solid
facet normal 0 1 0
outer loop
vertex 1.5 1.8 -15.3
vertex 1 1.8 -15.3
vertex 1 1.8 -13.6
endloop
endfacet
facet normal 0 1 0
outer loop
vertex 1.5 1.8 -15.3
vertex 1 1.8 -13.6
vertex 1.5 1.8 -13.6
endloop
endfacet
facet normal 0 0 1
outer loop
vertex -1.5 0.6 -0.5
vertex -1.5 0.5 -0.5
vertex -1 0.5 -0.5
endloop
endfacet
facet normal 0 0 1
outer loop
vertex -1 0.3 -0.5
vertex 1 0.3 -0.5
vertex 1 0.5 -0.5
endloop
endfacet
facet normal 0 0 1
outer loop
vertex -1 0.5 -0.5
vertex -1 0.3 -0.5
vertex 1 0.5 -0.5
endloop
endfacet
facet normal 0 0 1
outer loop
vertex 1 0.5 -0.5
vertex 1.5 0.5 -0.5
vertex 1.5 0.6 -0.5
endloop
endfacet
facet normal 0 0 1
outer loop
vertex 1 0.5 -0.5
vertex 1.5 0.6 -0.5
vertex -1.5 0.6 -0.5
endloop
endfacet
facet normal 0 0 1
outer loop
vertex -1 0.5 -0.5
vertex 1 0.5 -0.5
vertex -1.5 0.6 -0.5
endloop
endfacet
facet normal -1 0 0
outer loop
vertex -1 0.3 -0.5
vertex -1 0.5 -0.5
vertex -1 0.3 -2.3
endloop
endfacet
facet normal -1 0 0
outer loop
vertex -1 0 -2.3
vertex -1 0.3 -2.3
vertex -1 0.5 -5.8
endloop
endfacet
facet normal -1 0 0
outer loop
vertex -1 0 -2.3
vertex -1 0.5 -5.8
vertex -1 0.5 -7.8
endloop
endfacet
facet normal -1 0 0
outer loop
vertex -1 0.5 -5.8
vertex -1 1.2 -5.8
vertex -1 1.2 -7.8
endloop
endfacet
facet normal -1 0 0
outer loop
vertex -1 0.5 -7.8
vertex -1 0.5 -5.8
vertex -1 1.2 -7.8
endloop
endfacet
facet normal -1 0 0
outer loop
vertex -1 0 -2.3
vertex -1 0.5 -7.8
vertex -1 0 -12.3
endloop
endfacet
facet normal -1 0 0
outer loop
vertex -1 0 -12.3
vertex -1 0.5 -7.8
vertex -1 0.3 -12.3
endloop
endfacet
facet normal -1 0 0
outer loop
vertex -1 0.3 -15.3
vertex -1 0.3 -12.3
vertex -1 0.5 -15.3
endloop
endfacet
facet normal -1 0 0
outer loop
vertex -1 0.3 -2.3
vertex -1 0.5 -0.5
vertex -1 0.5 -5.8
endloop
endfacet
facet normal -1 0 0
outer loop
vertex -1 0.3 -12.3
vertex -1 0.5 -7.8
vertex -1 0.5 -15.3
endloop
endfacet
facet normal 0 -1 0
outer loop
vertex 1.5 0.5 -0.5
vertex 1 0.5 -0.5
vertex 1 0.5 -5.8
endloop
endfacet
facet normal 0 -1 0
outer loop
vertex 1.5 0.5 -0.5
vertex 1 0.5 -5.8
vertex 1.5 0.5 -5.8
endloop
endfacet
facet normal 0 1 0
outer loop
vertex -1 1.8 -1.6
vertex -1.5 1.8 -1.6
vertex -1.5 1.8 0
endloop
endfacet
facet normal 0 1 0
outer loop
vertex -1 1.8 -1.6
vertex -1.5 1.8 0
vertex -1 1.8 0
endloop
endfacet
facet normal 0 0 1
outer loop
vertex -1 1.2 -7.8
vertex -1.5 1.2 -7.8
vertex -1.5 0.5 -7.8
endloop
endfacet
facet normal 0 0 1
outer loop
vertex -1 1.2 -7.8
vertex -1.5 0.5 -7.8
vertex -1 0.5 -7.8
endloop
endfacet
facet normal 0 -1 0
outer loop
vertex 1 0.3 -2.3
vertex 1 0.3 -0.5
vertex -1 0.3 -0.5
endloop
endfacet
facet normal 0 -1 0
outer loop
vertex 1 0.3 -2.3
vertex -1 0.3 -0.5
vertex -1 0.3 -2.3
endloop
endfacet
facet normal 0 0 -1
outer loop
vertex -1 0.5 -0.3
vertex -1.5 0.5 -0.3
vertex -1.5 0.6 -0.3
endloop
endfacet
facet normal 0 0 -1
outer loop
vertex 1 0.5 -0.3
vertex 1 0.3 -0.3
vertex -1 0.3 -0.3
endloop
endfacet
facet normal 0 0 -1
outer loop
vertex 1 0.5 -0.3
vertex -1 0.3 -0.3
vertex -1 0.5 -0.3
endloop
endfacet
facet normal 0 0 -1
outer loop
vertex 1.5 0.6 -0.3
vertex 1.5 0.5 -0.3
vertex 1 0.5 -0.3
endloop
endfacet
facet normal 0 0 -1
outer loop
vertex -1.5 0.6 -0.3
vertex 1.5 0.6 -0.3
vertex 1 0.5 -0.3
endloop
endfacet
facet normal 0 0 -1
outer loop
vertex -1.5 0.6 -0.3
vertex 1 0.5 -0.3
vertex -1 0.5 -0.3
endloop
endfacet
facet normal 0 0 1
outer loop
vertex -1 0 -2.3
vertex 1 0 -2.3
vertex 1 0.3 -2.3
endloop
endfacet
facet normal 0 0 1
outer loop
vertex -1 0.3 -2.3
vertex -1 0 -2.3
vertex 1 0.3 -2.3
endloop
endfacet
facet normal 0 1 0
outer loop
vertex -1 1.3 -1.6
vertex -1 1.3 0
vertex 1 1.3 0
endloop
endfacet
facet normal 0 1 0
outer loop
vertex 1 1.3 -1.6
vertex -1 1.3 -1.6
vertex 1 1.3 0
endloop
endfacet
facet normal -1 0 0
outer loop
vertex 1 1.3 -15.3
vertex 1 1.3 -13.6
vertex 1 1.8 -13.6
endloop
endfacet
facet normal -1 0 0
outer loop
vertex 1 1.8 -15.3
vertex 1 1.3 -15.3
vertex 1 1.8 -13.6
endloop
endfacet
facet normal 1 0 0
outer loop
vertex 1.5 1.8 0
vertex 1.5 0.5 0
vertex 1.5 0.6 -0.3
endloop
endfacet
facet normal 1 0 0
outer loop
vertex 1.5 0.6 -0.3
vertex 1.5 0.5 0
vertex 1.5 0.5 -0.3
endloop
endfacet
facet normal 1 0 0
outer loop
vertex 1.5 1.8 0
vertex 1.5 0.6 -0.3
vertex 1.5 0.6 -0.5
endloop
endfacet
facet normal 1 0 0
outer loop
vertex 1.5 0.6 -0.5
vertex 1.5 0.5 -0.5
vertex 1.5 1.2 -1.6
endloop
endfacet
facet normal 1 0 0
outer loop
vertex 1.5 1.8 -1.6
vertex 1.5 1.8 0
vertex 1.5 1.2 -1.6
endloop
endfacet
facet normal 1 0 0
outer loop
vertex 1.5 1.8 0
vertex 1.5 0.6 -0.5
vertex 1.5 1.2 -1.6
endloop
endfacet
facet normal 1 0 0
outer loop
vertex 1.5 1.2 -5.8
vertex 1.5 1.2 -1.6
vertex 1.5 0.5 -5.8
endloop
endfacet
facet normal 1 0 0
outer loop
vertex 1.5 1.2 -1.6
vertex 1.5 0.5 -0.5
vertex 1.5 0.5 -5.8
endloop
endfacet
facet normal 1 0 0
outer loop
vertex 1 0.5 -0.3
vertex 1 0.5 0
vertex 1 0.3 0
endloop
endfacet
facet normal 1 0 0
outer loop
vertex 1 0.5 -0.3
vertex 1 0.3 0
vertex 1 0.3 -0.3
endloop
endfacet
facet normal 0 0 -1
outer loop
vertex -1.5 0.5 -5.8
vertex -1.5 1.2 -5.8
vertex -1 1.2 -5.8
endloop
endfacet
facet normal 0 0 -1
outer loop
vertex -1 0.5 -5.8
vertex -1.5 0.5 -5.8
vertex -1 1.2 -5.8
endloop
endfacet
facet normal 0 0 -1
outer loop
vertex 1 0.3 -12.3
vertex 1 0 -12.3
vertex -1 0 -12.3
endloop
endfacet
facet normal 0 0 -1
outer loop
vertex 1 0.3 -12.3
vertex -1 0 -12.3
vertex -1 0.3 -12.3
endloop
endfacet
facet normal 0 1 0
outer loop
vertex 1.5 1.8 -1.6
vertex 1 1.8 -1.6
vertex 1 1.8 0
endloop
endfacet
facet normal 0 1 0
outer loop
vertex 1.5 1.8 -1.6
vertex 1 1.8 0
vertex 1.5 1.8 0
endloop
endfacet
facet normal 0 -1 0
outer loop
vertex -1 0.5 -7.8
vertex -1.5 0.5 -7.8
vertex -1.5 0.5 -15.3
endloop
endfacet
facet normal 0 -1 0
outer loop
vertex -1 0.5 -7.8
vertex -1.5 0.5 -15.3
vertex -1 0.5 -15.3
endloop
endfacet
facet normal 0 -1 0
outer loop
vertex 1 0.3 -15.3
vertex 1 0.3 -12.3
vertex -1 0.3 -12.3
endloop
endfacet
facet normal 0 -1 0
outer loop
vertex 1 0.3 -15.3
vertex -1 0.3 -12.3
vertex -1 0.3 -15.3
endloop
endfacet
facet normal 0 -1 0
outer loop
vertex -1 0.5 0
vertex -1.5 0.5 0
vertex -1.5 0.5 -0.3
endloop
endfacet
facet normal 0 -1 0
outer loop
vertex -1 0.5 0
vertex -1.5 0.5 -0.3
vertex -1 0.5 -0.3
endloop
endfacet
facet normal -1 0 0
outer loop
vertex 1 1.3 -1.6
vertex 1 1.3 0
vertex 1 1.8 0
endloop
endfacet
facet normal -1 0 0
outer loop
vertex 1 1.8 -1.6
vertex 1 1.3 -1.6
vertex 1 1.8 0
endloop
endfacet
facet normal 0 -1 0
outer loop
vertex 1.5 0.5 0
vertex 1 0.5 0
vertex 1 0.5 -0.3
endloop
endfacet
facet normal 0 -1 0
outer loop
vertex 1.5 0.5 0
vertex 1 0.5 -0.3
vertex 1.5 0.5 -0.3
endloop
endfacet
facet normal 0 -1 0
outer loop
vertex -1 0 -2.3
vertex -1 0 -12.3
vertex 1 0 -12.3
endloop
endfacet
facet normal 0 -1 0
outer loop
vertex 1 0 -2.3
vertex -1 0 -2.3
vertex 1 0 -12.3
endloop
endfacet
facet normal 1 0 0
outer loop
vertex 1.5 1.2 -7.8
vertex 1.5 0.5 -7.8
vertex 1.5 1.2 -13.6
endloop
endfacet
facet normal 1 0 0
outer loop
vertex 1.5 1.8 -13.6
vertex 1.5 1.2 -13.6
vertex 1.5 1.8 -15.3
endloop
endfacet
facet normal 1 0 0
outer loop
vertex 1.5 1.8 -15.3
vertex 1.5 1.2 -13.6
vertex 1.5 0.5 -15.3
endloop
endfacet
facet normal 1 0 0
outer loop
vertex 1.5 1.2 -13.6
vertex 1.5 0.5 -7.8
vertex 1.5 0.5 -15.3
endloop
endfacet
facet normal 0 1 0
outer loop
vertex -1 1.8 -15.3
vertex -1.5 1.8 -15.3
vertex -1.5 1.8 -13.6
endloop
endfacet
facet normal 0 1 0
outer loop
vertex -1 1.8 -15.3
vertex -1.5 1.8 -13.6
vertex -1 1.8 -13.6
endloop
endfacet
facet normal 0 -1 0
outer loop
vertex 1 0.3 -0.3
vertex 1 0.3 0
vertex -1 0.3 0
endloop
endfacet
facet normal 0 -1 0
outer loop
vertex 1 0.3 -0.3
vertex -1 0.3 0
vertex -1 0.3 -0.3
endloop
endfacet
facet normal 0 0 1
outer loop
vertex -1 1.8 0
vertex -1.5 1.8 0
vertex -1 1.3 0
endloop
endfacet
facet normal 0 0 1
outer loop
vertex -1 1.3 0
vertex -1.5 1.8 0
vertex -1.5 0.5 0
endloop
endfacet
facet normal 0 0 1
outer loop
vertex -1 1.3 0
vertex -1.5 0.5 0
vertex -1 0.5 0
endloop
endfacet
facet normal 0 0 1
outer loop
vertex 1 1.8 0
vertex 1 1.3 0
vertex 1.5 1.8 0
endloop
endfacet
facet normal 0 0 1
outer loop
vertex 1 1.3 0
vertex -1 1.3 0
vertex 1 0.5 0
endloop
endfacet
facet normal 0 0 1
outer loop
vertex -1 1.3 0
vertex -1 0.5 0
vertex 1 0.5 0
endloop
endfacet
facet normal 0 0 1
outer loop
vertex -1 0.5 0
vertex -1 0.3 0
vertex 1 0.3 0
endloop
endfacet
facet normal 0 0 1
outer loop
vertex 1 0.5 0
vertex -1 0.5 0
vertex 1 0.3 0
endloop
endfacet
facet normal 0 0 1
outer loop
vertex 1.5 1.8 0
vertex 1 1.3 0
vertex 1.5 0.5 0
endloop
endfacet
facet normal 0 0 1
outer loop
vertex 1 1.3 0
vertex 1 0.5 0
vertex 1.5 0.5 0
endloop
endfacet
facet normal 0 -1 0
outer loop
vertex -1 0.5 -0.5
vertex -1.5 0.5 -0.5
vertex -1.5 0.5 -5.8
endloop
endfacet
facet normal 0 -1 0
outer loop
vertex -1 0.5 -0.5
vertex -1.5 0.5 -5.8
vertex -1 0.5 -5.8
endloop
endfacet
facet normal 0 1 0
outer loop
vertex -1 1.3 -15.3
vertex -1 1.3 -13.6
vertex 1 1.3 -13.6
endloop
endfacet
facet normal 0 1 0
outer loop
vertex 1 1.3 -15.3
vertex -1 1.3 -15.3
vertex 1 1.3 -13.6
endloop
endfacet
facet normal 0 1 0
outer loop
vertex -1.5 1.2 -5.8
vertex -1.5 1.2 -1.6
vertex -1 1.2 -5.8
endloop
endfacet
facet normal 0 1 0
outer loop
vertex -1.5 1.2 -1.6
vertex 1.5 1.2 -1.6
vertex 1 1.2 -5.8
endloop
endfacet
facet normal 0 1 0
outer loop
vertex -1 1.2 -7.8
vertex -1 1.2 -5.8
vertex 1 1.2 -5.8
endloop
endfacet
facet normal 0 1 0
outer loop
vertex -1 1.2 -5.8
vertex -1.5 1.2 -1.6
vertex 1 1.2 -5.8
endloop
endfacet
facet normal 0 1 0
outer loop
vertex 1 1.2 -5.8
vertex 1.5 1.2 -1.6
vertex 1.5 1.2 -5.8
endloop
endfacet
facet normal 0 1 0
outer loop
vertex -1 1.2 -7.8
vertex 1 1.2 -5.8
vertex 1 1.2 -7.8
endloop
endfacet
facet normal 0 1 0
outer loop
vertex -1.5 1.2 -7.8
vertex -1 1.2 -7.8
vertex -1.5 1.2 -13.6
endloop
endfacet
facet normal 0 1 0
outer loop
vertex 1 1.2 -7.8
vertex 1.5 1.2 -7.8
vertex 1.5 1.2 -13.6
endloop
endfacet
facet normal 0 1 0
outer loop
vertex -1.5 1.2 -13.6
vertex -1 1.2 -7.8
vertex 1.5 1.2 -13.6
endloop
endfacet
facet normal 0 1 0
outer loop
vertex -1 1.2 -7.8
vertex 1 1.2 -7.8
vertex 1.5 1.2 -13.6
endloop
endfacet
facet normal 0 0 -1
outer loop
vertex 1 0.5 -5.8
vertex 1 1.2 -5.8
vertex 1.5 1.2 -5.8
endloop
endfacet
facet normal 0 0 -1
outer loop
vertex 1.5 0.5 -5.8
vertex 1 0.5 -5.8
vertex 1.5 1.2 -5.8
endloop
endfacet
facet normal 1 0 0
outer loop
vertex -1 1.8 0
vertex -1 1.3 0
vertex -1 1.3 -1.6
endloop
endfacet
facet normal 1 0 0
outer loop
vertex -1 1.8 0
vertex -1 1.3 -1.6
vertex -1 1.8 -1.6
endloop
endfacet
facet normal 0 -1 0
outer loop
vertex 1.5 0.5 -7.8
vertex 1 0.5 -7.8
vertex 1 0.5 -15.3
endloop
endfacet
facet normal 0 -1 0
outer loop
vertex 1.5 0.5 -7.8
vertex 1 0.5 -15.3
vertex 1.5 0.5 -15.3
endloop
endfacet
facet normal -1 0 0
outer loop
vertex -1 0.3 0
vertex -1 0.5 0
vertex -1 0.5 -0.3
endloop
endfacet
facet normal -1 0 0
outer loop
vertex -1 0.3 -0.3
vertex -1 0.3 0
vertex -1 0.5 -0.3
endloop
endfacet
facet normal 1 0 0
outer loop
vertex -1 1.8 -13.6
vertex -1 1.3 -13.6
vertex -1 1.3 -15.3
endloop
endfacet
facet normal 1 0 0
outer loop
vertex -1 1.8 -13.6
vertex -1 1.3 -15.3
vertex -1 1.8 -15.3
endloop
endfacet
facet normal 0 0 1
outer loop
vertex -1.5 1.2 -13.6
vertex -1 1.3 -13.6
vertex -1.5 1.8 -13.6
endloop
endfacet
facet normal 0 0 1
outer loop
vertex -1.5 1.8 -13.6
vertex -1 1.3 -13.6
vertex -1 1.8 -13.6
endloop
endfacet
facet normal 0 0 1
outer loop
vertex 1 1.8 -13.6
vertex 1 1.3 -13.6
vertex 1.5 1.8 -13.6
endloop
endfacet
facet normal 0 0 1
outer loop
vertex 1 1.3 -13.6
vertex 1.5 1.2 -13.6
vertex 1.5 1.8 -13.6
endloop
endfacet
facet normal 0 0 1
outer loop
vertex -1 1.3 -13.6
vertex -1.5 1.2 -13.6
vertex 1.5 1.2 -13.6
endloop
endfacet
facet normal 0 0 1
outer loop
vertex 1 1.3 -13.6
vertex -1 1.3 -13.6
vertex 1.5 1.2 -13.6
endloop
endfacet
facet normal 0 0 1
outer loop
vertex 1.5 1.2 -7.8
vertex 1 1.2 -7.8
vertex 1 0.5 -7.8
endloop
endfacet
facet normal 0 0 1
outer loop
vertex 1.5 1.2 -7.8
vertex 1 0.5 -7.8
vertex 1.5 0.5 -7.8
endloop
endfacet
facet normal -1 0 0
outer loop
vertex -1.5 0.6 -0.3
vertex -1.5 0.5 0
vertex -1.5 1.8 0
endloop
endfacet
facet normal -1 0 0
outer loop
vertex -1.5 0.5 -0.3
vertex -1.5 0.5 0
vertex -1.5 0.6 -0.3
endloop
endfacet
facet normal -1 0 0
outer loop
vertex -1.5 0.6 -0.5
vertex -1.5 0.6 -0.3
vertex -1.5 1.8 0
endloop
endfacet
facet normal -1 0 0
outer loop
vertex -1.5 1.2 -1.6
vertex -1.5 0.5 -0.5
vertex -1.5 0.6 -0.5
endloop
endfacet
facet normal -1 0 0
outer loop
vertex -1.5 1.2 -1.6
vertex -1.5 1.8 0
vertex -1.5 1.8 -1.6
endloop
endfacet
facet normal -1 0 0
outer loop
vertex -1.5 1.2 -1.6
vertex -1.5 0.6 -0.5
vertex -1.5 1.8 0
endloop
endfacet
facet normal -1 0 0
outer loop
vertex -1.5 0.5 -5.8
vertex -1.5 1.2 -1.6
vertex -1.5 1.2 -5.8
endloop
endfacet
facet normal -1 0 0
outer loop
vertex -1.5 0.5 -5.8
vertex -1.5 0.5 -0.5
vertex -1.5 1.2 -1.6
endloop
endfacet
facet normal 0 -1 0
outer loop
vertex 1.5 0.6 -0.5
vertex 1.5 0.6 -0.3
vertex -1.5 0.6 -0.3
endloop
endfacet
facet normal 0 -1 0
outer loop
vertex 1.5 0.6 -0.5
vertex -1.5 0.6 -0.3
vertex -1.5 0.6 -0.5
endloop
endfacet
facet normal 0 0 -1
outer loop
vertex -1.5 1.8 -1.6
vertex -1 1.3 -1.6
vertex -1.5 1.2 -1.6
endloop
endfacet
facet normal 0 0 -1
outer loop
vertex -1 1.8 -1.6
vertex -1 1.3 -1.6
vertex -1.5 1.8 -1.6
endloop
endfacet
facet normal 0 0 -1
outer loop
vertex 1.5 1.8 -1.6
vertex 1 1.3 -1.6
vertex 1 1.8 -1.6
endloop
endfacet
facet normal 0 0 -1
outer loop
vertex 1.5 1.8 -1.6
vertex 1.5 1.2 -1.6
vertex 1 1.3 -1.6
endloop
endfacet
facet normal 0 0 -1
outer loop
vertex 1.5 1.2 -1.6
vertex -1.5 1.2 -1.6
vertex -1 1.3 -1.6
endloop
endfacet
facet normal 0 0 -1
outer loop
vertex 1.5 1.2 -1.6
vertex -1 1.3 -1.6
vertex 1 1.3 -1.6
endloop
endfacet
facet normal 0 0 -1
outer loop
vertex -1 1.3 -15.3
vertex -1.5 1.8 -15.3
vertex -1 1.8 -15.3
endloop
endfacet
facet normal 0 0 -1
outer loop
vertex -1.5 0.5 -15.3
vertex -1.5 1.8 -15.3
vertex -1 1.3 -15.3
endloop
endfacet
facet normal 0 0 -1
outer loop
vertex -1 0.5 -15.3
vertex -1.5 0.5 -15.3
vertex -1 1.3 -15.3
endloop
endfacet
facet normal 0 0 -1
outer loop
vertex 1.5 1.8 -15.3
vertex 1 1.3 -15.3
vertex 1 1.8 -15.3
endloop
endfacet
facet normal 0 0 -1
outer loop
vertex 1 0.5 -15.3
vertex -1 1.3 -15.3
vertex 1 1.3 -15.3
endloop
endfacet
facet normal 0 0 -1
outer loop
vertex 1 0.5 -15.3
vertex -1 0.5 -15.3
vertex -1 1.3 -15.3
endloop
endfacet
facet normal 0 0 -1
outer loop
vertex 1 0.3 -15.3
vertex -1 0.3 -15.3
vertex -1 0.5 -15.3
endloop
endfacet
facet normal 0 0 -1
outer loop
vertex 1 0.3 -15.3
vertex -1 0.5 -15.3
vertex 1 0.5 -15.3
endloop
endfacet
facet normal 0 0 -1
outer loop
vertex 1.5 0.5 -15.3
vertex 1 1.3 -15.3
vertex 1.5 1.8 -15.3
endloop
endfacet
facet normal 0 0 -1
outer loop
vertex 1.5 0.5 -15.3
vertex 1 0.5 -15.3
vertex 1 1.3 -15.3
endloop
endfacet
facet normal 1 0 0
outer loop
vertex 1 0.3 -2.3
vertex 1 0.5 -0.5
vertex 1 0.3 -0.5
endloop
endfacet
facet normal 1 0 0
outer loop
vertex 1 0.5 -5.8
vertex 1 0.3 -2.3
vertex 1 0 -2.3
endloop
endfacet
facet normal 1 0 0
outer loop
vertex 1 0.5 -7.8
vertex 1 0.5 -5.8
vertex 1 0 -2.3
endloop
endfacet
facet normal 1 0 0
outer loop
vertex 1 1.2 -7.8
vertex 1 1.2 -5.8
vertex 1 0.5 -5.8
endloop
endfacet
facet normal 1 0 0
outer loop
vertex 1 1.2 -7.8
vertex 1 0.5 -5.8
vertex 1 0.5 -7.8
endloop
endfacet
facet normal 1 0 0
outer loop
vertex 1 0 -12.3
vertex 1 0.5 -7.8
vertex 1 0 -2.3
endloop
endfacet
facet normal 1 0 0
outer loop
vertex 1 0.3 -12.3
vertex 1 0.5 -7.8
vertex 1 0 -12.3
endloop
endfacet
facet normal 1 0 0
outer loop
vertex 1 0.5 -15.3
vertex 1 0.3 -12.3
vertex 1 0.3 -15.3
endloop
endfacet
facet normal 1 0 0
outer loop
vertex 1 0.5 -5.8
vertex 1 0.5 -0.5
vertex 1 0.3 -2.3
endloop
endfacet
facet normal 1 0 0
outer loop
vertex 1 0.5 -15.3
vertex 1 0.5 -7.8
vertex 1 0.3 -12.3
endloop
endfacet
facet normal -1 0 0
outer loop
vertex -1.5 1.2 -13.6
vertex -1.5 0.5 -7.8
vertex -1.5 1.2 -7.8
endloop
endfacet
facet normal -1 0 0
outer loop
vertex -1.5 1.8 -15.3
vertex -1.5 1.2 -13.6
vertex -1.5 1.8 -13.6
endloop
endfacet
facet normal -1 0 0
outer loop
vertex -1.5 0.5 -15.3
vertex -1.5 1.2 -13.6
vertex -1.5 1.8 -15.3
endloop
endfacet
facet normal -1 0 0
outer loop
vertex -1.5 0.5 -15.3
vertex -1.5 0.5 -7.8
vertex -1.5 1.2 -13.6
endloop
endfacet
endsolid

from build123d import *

# Parameters (mm, degrees)
SKETCH2_W           = 3
SKETCH2_H           = 15.3
BOSS_EXTRUDE1_DEPTH = 1.8
SKETCH3_W           = 12
SKETCH3_H           = 0.6
CUT_EXTRUDE1_DEPTH  = 4
SKETCH4_W           = 2.3
SKETCH4_H           = 0.3
SKETCH4_W_2         = 3
CUT_EXTRUDE2_DEPTH  = 4
SKETCH5_W           = 0.5
SKETCH5_H           = 2
CUT_EXTRUDE3_DEPTH  = 2.2
SKETCH8_W           = 2
SKETCH8_H           = 0.5
CUT_EXTRUDE5_DEPTH  = 16.3
SKETCH9_W           = 0.5
SKETCH9_H           = 0.5
CUT_EXTRUDE6_DEPTH  = 16.3
SKETCH10_W          = 0.2
SKETCH10_H          = 0.3
CUT_EXTRUDE7_DEPTH  = 4


with BuildPart() as part:
    # Sketch2 → Boss-Extrude1 (new body)
    with BuildSketch(Plane(origin=(0, 0, 0), x_dir=(1, 0, 0), z_dir=(0, 1, 0))):
        with Locations((0, 7.65)):
            Rectangle(SKETCH2_W, SKETCH2_H)
    extrude(amount=BOSS_EXTRUDE1_DEPTH)

    # Sketch3 → Cut-Extrude1 (cut, through all)
    with BuildSketch(Plane(origin=(1.5, 0, 0), x_dir=(0, 0, -1), z_dir=(1, 0, 0))):
        with Locations((7.6, 1.5)):
            Rectangle(SKETCH3_W, SKETCH3_H)
    extrude(amount=-CUT_EXTRUDE1_DEPTH, mode=Mode.SUBTRACT)

    # Sketch4 → Cut-Extrude2 (cut, through all)
    with BuildSketch(Plane(origin=(1.5, 0, 0), x_dir=(0, 0, -1), z_dir=(1, 0, 0))):
        with Locations((1.15, 0.15)):
            Rectangle(SKETCH4_W, SKETCH4_H)
        with Locations((13.8, 0.15)):
            Rectangle(SKETCH4_W_2, SKETCH4_H)
    extrude(amount=-CUT_EXTRUDE2_DEPTH, mode=Mode.SUBTRACT)

    # Sketch5 → Cut-Extrude3 (cut, through all)
    with BuildSketch(Plane(origin=(0, 1.2, 0), x_dir=(1, 0, 0), z_dir=(0, 1, 0))):
        with Locations((-1.25, 6.8)):
            Rectangle(SKETCH5_W, SKETCH5_H)
        with Locations((1.25, 6.8)):
            Rectangle(SKETCH5_W, SKETCH5_H)
    extrude(amount=-CUT_EXTRUDE3_DEPTH, mode=Mode.SUBTRACT)

    # Sketch8 → Cut-Extrude5 (cut, through all)
    with BuildSketch(Plane.XY):
        with Locations((0, 1.55)):
            Rectangle(SKETCH8_W, SKETCH8_H)
    extrude(amount=-CUT_EXTRUDE5_DEPTH, mode=Mode.SUBTRACT)

    # Sketch9 → Cut-Extrude6 (cut, through all)
    with BuildSketch(Plane.XY):
        with Locations((-1.25, 0.25)):
            Rectangle(SKETCH9_W, SKETCH9_H)
        with Locations((1.25, 0.25)):
            Rectangle(SKETCH9_W, SKETCH9_H)
    extrude(amount=-CUT_EXTRUDE6_DEPTH, mode=Mode.SUBTRACT)

    # Sketch10 → Cut-Extrude7 (cut, through all)
    with BuildSketch(Plane(origin=(1.5, 0, 0), x_dir=(0, 0, -1), z_dir=(1, 0, 0))):
        with Locations((0.4, 0.45)):
            Rectangle(SKETCH10_W, SKETCH10_H)
    extrude(amount=-CUT_EXTRUDE7_DEPTH, mode=Mode.SUBTRACT)


solid = part.part
